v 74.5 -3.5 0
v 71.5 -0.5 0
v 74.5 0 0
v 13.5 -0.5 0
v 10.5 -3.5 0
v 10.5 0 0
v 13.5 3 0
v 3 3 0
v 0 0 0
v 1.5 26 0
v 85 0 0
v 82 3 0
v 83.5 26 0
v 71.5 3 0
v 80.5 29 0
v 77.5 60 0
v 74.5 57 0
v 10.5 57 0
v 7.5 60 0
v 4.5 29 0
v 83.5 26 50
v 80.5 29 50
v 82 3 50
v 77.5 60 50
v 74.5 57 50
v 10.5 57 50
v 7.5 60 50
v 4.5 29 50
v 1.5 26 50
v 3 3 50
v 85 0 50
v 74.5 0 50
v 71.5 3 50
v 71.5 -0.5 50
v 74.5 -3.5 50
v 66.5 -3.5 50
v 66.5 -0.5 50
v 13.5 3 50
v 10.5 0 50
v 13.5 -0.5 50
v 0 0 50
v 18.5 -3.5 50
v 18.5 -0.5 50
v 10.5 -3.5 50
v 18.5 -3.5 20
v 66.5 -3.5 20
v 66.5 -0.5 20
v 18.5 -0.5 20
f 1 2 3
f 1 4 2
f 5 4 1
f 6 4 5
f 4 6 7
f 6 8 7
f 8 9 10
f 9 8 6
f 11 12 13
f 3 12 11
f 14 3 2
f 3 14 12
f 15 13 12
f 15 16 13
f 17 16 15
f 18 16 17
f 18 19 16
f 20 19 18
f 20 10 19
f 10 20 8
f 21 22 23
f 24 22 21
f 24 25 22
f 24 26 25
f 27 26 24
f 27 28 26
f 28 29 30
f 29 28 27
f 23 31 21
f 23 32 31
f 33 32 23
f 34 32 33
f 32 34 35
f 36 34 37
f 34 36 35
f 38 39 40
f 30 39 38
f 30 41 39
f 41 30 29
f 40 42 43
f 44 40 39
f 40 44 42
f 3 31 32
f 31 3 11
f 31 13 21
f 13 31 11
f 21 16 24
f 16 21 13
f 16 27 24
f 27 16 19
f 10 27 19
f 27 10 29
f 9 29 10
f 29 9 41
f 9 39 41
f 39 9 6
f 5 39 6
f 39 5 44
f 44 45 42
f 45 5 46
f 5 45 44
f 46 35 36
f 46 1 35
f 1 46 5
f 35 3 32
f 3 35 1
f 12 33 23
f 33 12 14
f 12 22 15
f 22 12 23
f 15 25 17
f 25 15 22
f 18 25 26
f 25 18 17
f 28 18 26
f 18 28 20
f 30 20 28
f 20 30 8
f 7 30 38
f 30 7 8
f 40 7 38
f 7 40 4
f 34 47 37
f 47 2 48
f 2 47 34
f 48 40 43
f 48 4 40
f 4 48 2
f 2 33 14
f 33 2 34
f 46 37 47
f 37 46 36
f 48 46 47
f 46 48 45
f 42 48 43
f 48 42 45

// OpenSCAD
//78.5 front rectangle width
//66.5 back rectangel width
//53.7 depth
//26 back 76 width
//64
//57.16 slider width
//3 slider sticks out

//47 width of circular monitor mount junction
//30 height of circular monitor mount junction


neck_front_width = 79;
neck_mid_width = 76;
neck_rear_width = 64;
neck_depth_at_mid_width = 26;
neck_depth = 54;

collar_full_height = 50;

slider_depth = 3.5;
slider_width = 58;

slider_junction_width = 48;
slider_junction_height = 30;

wall_thickness = 3;

//difference(){
//cube([neck_front_width+wall_thickness*2, neck_depth+wall_thickness*2, 10],center = true);
//cube([neck_front_width, neck_depth, 10],center = true);
//}

difference(){
    linear_extrude(height=collar_full_height, scale=1){
        polygon( [ [0,0], 
        [(neck_front_width-slider_width)/2,0],
        [(neck_front_width-slider_width)/2,-slider_depth], 
        [neck_front_width-(neck_front_width-slider_width)/2+wall_thickness*2,-slider_depth], 
        [neck_front_width-(neck_front_width-slider_width)/2+wall_thickness*2,0], 
        [neck_front_width+wall_thickness*2,0], 
        [neck_front_width-((neck_front_width-neck_mid_width)/2)+wall_thickness*2,neck_depth_at_mid_width], 
        [neck_front_width-((neck_front_width-neck_rear_width)/2)+wall_thickness*2,neck_depth+wall_thickness*2], 
        [((neck_front_width-neck_rear_width)/2),neck_depth+wall_thickness*2], 
        [((neck_front_width-neck_mid_width)/2),neck_depth_at_mid_width] ] );
    }

//color("green"){
    translate([wall_thickness,wall_thickness,0]){
        //inside
        linear_extrude(height=collar_full_height, scale=1){
            polygon( [ [0,0], 
            [(neck_front_width-slider_width)/2,0],
            [(neck_front_width-slider_width)/2,-slider_depth], 
            [neck_front_width-(neck_front_width-slider_width)/2,-slider_depth], 
            [neck_front_width-(neck_front_width-slider_width)/2,0], 
            [neck_front_width,0], 
            [neck_front_width-((neck_front_width-neck_mid_width)/2),neck_depth_at_mid_width], 
            [neck_front_width-((neck_front_width-neck_rear_width)/2),neck_depth], 
            [((neck_front_width-neck_rear_width)/2),neck_depth], 
            [((neck_front_width-neck_mid_width)/2),neck_depth_at_mid_width] ] );
        }
    }
//}
    translate([(neck_front_width)/2-slider_junction_width/2+wall_thickness,-slider_depth,collar_full_height-slider_junction_height]){
        cube([slider_junction_width,10,slider_junction_height]);
    }
}
